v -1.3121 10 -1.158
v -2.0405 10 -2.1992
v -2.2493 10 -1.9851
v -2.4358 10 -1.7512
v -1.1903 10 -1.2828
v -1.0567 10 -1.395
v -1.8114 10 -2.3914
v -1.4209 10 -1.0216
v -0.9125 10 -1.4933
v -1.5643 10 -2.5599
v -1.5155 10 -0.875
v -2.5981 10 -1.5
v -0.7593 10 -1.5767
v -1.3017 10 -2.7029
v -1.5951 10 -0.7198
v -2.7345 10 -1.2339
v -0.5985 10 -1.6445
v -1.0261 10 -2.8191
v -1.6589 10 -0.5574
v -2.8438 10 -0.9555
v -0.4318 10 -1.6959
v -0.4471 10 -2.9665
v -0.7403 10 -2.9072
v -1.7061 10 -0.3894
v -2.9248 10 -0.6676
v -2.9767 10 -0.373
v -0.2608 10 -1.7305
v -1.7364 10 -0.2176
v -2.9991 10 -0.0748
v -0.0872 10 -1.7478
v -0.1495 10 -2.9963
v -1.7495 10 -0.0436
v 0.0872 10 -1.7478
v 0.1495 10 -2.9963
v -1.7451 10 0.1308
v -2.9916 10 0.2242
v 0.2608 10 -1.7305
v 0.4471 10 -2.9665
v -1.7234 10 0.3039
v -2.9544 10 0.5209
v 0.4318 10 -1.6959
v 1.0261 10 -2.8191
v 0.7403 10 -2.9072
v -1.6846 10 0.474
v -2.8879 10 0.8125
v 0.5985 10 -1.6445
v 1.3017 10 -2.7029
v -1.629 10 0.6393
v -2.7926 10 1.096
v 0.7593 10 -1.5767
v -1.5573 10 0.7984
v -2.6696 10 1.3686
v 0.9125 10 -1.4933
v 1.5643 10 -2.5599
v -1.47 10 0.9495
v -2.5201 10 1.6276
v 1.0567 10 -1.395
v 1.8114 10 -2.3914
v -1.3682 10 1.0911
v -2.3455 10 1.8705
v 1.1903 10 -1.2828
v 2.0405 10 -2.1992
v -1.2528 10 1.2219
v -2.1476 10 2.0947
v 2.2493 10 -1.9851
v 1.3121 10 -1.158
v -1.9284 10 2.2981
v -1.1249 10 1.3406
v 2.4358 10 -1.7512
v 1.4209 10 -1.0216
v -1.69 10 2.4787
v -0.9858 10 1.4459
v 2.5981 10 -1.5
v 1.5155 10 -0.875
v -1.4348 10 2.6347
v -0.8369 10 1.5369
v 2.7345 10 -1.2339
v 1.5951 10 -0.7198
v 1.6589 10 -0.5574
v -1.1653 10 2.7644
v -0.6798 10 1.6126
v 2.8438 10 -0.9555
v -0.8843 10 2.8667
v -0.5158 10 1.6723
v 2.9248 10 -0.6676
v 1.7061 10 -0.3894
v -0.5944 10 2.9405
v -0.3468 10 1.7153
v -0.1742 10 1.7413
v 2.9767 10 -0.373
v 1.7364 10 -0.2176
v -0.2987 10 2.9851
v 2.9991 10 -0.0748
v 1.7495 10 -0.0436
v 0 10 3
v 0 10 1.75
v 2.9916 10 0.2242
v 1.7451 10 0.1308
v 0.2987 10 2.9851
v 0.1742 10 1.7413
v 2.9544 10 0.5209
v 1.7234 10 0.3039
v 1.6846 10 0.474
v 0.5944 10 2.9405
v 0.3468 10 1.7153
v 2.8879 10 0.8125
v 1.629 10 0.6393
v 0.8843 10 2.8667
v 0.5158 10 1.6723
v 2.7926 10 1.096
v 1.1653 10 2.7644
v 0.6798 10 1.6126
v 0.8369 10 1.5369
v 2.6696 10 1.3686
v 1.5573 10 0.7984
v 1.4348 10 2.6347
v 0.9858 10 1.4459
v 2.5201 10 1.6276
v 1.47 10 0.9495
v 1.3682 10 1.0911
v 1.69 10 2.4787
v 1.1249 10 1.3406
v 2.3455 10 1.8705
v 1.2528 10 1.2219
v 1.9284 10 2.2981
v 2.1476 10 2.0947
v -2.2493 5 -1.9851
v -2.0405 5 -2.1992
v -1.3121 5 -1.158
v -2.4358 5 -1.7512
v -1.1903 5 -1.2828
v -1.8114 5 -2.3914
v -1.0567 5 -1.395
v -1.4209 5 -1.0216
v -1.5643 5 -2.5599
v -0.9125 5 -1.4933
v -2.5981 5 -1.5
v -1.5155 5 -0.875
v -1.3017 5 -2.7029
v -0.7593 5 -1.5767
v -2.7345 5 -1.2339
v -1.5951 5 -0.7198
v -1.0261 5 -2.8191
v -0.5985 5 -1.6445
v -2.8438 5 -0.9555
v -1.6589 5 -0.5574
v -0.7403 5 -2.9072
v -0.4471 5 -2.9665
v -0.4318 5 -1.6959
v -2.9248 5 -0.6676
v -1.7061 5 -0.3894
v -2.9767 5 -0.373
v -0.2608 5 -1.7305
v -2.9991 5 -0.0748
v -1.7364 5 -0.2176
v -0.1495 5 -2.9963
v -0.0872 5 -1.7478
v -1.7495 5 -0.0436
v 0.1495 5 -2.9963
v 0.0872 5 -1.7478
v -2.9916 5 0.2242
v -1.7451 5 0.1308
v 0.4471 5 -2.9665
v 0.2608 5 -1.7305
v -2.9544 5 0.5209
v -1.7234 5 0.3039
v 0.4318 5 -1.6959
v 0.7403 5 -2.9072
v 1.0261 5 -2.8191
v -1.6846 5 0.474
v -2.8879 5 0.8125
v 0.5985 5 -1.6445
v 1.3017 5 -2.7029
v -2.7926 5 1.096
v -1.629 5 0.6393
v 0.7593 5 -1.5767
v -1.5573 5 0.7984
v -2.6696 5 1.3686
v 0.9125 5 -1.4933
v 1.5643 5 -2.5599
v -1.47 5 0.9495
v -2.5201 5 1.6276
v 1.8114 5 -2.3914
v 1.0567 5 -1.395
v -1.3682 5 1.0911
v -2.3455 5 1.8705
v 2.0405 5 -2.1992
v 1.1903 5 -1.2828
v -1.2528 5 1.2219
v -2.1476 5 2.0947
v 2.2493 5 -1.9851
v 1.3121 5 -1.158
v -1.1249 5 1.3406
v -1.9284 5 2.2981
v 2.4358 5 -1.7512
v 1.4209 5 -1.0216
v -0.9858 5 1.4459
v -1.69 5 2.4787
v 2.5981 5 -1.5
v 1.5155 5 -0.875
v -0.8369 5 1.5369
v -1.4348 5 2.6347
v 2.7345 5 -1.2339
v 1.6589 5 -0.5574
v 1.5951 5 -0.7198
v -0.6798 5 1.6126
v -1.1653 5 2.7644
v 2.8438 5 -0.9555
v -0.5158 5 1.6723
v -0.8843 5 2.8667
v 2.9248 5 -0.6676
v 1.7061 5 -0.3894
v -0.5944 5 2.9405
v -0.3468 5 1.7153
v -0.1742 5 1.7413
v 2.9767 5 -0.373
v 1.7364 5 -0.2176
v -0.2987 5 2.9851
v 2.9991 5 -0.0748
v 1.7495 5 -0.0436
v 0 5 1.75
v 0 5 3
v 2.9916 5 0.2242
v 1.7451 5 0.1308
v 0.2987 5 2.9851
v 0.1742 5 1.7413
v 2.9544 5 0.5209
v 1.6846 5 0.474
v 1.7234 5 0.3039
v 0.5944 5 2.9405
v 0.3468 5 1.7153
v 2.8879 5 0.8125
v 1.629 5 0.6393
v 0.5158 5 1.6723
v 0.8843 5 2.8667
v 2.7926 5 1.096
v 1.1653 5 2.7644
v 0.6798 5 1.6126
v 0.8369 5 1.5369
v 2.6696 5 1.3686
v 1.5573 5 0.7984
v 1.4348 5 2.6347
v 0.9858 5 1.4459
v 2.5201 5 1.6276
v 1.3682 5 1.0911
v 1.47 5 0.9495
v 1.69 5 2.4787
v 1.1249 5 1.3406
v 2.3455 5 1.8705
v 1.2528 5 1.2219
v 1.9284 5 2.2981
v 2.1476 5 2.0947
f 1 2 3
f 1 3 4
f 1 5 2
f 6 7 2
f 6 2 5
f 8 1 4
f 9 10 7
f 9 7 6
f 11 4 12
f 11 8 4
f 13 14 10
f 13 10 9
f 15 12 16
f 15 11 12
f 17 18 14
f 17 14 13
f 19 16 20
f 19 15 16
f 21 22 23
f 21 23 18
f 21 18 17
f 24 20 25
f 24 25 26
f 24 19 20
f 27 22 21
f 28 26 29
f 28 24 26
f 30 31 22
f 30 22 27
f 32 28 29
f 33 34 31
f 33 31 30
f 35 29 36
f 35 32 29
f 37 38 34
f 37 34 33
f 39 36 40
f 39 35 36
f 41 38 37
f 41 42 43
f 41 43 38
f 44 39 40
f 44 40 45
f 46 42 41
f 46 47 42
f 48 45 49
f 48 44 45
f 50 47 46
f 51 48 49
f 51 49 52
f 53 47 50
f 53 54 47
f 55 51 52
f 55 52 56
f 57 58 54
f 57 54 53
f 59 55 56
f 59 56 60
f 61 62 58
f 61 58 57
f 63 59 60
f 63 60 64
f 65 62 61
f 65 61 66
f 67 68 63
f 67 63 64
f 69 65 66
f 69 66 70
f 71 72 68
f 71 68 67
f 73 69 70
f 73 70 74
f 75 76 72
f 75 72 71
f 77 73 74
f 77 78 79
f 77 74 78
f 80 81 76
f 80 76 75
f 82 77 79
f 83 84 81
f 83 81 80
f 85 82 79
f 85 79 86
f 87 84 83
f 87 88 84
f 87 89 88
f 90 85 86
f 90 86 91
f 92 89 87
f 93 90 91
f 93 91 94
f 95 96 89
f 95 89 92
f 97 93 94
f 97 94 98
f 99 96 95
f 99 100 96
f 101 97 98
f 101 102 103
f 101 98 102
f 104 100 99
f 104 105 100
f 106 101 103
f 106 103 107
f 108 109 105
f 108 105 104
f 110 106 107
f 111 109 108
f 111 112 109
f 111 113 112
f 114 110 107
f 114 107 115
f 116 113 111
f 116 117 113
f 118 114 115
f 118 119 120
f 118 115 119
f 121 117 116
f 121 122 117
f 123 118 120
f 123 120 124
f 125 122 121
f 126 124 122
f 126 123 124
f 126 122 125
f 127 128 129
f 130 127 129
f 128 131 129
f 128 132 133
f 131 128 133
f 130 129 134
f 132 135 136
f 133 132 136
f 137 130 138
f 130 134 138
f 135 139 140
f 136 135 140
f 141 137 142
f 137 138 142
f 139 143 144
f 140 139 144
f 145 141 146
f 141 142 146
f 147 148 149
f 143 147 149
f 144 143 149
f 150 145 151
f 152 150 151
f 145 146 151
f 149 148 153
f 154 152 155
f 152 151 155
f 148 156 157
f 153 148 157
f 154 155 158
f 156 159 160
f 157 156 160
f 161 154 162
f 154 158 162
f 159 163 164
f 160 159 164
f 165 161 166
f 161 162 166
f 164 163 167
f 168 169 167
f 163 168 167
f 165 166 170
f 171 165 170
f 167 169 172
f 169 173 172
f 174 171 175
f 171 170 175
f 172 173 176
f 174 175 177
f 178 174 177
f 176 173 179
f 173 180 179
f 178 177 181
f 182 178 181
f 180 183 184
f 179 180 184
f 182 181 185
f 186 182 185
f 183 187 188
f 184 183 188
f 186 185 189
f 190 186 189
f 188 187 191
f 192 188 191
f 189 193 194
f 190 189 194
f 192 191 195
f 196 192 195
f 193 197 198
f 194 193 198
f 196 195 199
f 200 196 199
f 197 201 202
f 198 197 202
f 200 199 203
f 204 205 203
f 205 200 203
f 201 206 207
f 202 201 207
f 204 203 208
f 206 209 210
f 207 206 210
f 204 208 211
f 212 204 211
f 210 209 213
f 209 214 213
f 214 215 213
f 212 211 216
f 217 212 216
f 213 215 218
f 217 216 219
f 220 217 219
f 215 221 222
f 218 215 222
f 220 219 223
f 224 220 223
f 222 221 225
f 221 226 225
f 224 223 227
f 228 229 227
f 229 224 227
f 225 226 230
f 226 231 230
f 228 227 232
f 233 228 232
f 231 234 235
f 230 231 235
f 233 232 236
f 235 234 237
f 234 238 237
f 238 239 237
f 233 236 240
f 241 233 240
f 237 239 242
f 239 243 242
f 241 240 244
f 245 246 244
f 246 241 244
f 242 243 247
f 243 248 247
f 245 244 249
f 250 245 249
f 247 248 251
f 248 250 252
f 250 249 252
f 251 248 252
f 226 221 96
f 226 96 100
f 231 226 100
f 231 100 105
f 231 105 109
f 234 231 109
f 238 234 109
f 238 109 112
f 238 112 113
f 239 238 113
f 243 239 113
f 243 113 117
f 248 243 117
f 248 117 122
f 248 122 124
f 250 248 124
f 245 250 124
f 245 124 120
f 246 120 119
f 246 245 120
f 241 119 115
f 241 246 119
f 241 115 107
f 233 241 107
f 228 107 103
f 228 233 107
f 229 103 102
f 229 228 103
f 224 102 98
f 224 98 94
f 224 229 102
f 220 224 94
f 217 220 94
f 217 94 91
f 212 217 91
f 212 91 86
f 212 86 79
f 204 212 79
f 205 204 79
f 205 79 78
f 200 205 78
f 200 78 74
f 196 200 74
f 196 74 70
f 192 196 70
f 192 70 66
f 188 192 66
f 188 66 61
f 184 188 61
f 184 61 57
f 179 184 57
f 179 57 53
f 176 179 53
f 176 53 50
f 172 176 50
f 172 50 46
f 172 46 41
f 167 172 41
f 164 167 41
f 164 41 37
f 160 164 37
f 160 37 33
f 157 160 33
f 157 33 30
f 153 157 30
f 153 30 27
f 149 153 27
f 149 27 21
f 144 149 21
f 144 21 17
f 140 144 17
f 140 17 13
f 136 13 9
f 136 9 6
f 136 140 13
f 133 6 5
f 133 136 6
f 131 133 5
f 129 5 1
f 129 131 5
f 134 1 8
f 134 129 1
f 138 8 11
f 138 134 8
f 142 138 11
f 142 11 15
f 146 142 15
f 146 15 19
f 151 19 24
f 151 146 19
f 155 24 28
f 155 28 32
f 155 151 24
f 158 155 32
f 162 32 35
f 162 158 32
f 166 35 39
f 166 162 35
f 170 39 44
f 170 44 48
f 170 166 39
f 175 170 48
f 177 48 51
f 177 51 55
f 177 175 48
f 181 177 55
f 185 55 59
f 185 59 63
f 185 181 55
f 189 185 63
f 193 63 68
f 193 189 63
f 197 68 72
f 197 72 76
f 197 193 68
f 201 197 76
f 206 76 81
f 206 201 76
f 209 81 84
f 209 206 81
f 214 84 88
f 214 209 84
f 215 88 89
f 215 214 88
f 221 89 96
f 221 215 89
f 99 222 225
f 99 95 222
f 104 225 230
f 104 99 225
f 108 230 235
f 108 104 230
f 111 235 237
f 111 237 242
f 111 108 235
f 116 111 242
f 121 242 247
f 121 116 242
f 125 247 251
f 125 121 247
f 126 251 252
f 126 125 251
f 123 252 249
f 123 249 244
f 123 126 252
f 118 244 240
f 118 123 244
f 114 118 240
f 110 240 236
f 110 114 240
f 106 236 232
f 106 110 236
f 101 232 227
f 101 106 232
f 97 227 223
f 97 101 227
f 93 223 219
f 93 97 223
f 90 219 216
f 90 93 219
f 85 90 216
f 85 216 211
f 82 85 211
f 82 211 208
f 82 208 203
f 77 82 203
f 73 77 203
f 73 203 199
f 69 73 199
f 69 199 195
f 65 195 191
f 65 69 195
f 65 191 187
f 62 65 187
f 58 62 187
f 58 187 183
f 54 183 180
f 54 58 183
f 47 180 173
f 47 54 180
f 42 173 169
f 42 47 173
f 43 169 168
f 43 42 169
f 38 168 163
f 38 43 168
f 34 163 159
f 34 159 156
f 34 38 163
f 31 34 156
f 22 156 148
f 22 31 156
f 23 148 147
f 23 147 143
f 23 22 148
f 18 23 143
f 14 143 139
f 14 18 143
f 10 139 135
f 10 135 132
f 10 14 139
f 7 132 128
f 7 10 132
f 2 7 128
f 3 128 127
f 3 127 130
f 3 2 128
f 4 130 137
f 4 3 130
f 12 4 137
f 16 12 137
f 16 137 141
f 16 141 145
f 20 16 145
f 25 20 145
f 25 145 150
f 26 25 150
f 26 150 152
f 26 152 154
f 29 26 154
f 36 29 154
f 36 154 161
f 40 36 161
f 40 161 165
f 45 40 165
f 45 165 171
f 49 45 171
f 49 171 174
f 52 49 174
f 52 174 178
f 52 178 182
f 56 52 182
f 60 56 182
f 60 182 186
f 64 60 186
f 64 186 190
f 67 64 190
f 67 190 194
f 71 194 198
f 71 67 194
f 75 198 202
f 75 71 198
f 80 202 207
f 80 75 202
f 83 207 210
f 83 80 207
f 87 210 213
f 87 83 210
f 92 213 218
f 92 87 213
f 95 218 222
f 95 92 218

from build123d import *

# Parameters (mm, degrees)
SKETCH1_R           = 3
SKETCH1_R_2         = 1.75
BOSS_EXTRUDE1_DEPTH = 10
MOVE_FACE1_BY       = 5
MOVE_FACE2_BY       = 10


with BuildPart() as part:
    # Sketch1 → Boss-Extrude1 (new body)
    with BuildSketch(Plane(origin=(0, 0, 0), x_dir=(1, 0, 0), z_dir=(0, 1, 0))):
        with Locations(Location((0, 0, 0), (0, 0, 270))):
            Circle(SKETCH1_R)
        with Locations(Location((0, 0, 0), (0, 0, 270))):
            Circle(SKETCH1_R_2, mode=Mode.SUBTRACT)
    extrude(amount=BOSS_EXTRUDE1_DEPTH)

    # Move Face1: a face moved outward by 5.0
    extrude(part.faces().sort_by_distance((0, 0, 2.4))[0], amount=MOVE_FACE1_BY, dir=(0, -1, 0))

    # Move Face2: a face moved inward by 10.0
    extrude(part.faces().sort_by_distance((0, -5, 2.4))[0], amount=MOVE_FACE2_BY, dir=(0, 1, 0), mode=Mode.SUBTRACT)


solid = part.part
